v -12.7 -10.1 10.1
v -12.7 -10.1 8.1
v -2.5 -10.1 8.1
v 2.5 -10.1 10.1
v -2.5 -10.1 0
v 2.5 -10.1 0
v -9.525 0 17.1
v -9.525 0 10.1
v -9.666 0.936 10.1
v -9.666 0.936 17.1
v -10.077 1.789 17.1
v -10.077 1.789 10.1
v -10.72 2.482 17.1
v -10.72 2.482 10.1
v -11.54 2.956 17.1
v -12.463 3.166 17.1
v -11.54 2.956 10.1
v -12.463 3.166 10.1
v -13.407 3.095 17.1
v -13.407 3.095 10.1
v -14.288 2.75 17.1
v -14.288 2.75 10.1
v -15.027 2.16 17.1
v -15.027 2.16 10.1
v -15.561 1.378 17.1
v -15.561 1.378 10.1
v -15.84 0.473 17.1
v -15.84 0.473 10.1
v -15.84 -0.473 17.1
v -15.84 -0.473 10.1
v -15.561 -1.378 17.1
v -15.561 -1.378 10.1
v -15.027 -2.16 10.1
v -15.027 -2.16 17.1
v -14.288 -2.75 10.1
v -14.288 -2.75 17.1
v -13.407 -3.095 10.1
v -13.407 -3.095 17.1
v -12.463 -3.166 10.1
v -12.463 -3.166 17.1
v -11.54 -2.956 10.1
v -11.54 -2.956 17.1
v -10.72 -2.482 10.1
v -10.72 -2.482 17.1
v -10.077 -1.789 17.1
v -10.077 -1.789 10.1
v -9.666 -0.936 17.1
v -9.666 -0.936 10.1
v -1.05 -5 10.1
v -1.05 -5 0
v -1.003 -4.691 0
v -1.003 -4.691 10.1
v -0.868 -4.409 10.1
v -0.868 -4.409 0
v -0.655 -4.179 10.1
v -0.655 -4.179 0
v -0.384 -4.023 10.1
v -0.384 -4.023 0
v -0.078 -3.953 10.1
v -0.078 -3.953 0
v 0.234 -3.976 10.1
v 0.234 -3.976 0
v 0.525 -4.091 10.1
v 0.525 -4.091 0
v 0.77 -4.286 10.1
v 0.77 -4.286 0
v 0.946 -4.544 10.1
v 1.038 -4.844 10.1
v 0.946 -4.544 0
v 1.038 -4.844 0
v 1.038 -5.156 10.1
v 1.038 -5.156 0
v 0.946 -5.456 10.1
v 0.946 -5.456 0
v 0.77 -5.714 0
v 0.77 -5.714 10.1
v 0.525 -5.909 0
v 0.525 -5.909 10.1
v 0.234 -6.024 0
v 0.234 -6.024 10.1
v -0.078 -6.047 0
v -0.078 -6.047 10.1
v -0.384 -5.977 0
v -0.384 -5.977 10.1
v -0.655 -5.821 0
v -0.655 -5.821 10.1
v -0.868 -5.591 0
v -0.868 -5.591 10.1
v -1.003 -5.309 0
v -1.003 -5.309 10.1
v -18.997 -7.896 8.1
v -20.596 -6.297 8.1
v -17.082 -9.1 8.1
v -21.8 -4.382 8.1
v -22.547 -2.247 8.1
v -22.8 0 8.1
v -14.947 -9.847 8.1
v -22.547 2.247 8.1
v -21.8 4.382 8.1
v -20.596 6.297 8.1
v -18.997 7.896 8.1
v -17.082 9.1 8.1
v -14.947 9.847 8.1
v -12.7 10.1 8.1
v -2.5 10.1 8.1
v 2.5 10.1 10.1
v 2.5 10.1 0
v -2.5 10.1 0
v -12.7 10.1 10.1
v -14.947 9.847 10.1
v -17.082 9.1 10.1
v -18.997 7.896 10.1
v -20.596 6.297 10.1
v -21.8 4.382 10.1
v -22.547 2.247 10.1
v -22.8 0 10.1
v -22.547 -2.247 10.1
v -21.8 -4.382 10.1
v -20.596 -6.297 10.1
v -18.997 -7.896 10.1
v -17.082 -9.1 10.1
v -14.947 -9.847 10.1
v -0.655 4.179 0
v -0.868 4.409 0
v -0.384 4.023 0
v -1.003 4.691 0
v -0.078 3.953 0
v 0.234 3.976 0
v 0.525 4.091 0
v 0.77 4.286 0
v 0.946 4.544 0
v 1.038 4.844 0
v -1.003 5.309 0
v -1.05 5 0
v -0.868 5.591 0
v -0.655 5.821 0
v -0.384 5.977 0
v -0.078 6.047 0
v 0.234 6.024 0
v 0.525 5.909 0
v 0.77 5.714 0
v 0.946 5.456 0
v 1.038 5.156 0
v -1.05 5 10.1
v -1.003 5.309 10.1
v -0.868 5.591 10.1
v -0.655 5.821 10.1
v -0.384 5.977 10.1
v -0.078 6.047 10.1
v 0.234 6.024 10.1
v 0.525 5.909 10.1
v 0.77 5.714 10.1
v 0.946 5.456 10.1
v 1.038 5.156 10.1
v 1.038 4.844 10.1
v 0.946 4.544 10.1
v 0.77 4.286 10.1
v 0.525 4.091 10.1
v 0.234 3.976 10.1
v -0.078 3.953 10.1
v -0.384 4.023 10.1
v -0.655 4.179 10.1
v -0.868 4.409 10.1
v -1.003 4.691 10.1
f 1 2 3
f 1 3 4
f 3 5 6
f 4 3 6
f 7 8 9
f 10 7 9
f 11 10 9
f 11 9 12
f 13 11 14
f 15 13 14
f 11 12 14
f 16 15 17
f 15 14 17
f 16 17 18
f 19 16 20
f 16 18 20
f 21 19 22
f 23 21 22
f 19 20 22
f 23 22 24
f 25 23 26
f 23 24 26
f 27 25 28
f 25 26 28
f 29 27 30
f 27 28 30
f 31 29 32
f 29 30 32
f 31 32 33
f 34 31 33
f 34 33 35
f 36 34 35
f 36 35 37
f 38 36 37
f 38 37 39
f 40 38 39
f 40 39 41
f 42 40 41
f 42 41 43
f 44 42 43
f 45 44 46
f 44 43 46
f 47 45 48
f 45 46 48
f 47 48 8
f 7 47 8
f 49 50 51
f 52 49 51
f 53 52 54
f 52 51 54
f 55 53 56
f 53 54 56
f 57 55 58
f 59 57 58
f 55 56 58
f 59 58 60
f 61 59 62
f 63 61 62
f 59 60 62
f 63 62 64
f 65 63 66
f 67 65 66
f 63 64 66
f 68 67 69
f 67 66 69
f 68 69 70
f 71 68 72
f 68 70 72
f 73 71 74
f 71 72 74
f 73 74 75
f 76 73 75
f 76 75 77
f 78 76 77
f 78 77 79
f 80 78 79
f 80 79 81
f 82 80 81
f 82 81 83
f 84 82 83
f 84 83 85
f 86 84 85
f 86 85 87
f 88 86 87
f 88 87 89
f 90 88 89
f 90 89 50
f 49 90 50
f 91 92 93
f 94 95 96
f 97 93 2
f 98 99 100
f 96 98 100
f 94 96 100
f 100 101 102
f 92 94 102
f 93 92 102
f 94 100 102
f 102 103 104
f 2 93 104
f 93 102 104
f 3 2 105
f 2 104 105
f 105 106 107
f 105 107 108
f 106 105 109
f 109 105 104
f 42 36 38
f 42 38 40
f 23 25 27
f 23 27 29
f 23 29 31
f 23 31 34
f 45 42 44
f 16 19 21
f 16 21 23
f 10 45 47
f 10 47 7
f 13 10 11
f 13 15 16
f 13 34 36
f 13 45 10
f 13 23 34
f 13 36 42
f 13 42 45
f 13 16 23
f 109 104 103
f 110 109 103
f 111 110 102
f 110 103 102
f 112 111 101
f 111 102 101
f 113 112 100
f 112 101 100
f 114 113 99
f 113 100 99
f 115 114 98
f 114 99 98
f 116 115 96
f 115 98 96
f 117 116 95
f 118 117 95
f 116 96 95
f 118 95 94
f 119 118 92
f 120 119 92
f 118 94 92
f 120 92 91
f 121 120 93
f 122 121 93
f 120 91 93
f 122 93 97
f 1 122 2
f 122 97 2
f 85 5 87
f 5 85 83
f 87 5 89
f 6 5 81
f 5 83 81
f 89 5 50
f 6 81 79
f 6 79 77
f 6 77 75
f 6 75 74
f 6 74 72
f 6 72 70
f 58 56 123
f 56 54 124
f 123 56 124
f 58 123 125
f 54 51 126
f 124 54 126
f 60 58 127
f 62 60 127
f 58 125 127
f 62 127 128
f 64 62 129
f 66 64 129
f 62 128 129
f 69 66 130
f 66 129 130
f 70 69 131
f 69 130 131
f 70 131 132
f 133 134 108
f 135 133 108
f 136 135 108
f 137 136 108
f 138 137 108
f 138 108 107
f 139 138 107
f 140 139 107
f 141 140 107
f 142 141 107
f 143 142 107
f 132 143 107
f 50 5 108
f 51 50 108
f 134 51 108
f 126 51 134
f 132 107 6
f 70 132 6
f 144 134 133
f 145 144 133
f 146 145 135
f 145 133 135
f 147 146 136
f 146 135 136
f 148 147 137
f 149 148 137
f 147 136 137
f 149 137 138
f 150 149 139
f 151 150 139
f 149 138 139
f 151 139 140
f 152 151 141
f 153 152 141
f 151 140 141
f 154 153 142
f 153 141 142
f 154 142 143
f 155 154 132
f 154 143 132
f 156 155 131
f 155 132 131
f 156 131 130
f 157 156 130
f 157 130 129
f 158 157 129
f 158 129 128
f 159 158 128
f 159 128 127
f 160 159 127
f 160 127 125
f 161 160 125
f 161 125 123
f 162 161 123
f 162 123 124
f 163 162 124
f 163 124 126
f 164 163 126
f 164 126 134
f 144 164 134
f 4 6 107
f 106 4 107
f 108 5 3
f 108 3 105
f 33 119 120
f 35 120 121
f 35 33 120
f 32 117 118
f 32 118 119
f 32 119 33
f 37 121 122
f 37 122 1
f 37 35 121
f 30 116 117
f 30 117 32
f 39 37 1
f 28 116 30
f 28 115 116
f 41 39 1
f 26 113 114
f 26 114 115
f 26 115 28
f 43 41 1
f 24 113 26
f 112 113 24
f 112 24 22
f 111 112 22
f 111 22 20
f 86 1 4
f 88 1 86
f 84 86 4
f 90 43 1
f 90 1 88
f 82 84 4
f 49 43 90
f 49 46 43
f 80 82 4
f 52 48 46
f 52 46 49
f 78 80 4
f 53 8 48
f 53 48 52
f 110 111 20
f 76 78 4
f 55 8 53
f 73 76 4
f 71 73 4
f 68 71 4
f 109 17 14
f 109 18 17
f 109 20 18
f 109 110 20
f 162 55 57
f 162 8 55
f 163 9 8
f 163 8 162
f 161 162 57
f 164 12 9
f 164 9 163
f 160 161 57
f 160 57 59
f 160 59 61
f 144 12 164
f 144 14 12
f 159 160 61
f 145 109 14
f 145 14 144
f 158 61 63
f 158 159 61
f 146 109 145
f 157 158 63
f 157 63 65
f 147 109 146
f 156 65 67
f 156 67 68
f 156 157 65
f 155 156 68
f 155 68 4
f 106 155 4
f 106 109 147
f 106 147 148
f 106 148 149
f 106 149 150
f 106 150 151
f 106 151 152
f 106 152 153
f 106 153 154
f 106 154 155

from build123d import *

# Parameters (mm, degrees)
ESQUISSE1_W             = 5
ESQUISSE1_H             = 20.2
BOSS_EXTRU_1_DEPTH      = 8.1
BOSS_EXTRU_2_DEPTH      = 2
ESQUISSE3_R             = 3.175
BOSS_EXTRU_3_DEPTH      = 7
ESQUISSE4_R             = 1.05
ENL_V_MAT_EXTRU_1_DEPTH = 31.236732628


with BuildPart() as part:
    # Esquisse1 → Boss.-Extru.1 (new body)
    with BuildSketch(Plane.XY):
        Rectangle(ESQUISSE1_W, ESQUISSE1_H)
    extrude(amount=BOSS_EXTRU_1_DEPTH)

    # Esquisse2 → Boss.-Extru.2 (add)
    with BuildSketch(Plane.XY.offset(8.1)):
        with BuildLine():
            Line((2.5, 10.1), (-12.7, 10.1))
            ThreePointArc((-12.7, 10.1), (-22.8, 0), (-12.7, -10.1))
            Line((-12.7, -10.1), (2.5, -10.1))
            Line((2.5, -10.1), (2.5, 10.1))
        make_face()
    extrude(amount=BOSS_EXTRU_2_DEPTH)

    # Esquisse3 → Boss.-Extru.3 (add)
    with BuildSketch(Plane.XY.offset(10.1)):
        with Locations((-12.7, 0)):
            Circle(ESQUISSE3_R)
    extrude(amount=BOSS_EXTRU_3_DEPTH)

    # Esquisse4 → Enlèv. mat.-Extru.1 (cut, through all)
    with BuildSketch(Plane(origin=(0, 0, 0), x_dir=(-1, 0, 0), z_dir=(0, 0, -1))):
        with Locations((0, 5)):
            Circle(ESQUISSE4_R)
        with Locations((0, -5)):
            Circle(ESQUISSE4_R)
    extrude(amount=-ENL_V_MAT_EXTRU_1_DEPTH, mode=Mode.SUBTRACT)


solid = part.part
